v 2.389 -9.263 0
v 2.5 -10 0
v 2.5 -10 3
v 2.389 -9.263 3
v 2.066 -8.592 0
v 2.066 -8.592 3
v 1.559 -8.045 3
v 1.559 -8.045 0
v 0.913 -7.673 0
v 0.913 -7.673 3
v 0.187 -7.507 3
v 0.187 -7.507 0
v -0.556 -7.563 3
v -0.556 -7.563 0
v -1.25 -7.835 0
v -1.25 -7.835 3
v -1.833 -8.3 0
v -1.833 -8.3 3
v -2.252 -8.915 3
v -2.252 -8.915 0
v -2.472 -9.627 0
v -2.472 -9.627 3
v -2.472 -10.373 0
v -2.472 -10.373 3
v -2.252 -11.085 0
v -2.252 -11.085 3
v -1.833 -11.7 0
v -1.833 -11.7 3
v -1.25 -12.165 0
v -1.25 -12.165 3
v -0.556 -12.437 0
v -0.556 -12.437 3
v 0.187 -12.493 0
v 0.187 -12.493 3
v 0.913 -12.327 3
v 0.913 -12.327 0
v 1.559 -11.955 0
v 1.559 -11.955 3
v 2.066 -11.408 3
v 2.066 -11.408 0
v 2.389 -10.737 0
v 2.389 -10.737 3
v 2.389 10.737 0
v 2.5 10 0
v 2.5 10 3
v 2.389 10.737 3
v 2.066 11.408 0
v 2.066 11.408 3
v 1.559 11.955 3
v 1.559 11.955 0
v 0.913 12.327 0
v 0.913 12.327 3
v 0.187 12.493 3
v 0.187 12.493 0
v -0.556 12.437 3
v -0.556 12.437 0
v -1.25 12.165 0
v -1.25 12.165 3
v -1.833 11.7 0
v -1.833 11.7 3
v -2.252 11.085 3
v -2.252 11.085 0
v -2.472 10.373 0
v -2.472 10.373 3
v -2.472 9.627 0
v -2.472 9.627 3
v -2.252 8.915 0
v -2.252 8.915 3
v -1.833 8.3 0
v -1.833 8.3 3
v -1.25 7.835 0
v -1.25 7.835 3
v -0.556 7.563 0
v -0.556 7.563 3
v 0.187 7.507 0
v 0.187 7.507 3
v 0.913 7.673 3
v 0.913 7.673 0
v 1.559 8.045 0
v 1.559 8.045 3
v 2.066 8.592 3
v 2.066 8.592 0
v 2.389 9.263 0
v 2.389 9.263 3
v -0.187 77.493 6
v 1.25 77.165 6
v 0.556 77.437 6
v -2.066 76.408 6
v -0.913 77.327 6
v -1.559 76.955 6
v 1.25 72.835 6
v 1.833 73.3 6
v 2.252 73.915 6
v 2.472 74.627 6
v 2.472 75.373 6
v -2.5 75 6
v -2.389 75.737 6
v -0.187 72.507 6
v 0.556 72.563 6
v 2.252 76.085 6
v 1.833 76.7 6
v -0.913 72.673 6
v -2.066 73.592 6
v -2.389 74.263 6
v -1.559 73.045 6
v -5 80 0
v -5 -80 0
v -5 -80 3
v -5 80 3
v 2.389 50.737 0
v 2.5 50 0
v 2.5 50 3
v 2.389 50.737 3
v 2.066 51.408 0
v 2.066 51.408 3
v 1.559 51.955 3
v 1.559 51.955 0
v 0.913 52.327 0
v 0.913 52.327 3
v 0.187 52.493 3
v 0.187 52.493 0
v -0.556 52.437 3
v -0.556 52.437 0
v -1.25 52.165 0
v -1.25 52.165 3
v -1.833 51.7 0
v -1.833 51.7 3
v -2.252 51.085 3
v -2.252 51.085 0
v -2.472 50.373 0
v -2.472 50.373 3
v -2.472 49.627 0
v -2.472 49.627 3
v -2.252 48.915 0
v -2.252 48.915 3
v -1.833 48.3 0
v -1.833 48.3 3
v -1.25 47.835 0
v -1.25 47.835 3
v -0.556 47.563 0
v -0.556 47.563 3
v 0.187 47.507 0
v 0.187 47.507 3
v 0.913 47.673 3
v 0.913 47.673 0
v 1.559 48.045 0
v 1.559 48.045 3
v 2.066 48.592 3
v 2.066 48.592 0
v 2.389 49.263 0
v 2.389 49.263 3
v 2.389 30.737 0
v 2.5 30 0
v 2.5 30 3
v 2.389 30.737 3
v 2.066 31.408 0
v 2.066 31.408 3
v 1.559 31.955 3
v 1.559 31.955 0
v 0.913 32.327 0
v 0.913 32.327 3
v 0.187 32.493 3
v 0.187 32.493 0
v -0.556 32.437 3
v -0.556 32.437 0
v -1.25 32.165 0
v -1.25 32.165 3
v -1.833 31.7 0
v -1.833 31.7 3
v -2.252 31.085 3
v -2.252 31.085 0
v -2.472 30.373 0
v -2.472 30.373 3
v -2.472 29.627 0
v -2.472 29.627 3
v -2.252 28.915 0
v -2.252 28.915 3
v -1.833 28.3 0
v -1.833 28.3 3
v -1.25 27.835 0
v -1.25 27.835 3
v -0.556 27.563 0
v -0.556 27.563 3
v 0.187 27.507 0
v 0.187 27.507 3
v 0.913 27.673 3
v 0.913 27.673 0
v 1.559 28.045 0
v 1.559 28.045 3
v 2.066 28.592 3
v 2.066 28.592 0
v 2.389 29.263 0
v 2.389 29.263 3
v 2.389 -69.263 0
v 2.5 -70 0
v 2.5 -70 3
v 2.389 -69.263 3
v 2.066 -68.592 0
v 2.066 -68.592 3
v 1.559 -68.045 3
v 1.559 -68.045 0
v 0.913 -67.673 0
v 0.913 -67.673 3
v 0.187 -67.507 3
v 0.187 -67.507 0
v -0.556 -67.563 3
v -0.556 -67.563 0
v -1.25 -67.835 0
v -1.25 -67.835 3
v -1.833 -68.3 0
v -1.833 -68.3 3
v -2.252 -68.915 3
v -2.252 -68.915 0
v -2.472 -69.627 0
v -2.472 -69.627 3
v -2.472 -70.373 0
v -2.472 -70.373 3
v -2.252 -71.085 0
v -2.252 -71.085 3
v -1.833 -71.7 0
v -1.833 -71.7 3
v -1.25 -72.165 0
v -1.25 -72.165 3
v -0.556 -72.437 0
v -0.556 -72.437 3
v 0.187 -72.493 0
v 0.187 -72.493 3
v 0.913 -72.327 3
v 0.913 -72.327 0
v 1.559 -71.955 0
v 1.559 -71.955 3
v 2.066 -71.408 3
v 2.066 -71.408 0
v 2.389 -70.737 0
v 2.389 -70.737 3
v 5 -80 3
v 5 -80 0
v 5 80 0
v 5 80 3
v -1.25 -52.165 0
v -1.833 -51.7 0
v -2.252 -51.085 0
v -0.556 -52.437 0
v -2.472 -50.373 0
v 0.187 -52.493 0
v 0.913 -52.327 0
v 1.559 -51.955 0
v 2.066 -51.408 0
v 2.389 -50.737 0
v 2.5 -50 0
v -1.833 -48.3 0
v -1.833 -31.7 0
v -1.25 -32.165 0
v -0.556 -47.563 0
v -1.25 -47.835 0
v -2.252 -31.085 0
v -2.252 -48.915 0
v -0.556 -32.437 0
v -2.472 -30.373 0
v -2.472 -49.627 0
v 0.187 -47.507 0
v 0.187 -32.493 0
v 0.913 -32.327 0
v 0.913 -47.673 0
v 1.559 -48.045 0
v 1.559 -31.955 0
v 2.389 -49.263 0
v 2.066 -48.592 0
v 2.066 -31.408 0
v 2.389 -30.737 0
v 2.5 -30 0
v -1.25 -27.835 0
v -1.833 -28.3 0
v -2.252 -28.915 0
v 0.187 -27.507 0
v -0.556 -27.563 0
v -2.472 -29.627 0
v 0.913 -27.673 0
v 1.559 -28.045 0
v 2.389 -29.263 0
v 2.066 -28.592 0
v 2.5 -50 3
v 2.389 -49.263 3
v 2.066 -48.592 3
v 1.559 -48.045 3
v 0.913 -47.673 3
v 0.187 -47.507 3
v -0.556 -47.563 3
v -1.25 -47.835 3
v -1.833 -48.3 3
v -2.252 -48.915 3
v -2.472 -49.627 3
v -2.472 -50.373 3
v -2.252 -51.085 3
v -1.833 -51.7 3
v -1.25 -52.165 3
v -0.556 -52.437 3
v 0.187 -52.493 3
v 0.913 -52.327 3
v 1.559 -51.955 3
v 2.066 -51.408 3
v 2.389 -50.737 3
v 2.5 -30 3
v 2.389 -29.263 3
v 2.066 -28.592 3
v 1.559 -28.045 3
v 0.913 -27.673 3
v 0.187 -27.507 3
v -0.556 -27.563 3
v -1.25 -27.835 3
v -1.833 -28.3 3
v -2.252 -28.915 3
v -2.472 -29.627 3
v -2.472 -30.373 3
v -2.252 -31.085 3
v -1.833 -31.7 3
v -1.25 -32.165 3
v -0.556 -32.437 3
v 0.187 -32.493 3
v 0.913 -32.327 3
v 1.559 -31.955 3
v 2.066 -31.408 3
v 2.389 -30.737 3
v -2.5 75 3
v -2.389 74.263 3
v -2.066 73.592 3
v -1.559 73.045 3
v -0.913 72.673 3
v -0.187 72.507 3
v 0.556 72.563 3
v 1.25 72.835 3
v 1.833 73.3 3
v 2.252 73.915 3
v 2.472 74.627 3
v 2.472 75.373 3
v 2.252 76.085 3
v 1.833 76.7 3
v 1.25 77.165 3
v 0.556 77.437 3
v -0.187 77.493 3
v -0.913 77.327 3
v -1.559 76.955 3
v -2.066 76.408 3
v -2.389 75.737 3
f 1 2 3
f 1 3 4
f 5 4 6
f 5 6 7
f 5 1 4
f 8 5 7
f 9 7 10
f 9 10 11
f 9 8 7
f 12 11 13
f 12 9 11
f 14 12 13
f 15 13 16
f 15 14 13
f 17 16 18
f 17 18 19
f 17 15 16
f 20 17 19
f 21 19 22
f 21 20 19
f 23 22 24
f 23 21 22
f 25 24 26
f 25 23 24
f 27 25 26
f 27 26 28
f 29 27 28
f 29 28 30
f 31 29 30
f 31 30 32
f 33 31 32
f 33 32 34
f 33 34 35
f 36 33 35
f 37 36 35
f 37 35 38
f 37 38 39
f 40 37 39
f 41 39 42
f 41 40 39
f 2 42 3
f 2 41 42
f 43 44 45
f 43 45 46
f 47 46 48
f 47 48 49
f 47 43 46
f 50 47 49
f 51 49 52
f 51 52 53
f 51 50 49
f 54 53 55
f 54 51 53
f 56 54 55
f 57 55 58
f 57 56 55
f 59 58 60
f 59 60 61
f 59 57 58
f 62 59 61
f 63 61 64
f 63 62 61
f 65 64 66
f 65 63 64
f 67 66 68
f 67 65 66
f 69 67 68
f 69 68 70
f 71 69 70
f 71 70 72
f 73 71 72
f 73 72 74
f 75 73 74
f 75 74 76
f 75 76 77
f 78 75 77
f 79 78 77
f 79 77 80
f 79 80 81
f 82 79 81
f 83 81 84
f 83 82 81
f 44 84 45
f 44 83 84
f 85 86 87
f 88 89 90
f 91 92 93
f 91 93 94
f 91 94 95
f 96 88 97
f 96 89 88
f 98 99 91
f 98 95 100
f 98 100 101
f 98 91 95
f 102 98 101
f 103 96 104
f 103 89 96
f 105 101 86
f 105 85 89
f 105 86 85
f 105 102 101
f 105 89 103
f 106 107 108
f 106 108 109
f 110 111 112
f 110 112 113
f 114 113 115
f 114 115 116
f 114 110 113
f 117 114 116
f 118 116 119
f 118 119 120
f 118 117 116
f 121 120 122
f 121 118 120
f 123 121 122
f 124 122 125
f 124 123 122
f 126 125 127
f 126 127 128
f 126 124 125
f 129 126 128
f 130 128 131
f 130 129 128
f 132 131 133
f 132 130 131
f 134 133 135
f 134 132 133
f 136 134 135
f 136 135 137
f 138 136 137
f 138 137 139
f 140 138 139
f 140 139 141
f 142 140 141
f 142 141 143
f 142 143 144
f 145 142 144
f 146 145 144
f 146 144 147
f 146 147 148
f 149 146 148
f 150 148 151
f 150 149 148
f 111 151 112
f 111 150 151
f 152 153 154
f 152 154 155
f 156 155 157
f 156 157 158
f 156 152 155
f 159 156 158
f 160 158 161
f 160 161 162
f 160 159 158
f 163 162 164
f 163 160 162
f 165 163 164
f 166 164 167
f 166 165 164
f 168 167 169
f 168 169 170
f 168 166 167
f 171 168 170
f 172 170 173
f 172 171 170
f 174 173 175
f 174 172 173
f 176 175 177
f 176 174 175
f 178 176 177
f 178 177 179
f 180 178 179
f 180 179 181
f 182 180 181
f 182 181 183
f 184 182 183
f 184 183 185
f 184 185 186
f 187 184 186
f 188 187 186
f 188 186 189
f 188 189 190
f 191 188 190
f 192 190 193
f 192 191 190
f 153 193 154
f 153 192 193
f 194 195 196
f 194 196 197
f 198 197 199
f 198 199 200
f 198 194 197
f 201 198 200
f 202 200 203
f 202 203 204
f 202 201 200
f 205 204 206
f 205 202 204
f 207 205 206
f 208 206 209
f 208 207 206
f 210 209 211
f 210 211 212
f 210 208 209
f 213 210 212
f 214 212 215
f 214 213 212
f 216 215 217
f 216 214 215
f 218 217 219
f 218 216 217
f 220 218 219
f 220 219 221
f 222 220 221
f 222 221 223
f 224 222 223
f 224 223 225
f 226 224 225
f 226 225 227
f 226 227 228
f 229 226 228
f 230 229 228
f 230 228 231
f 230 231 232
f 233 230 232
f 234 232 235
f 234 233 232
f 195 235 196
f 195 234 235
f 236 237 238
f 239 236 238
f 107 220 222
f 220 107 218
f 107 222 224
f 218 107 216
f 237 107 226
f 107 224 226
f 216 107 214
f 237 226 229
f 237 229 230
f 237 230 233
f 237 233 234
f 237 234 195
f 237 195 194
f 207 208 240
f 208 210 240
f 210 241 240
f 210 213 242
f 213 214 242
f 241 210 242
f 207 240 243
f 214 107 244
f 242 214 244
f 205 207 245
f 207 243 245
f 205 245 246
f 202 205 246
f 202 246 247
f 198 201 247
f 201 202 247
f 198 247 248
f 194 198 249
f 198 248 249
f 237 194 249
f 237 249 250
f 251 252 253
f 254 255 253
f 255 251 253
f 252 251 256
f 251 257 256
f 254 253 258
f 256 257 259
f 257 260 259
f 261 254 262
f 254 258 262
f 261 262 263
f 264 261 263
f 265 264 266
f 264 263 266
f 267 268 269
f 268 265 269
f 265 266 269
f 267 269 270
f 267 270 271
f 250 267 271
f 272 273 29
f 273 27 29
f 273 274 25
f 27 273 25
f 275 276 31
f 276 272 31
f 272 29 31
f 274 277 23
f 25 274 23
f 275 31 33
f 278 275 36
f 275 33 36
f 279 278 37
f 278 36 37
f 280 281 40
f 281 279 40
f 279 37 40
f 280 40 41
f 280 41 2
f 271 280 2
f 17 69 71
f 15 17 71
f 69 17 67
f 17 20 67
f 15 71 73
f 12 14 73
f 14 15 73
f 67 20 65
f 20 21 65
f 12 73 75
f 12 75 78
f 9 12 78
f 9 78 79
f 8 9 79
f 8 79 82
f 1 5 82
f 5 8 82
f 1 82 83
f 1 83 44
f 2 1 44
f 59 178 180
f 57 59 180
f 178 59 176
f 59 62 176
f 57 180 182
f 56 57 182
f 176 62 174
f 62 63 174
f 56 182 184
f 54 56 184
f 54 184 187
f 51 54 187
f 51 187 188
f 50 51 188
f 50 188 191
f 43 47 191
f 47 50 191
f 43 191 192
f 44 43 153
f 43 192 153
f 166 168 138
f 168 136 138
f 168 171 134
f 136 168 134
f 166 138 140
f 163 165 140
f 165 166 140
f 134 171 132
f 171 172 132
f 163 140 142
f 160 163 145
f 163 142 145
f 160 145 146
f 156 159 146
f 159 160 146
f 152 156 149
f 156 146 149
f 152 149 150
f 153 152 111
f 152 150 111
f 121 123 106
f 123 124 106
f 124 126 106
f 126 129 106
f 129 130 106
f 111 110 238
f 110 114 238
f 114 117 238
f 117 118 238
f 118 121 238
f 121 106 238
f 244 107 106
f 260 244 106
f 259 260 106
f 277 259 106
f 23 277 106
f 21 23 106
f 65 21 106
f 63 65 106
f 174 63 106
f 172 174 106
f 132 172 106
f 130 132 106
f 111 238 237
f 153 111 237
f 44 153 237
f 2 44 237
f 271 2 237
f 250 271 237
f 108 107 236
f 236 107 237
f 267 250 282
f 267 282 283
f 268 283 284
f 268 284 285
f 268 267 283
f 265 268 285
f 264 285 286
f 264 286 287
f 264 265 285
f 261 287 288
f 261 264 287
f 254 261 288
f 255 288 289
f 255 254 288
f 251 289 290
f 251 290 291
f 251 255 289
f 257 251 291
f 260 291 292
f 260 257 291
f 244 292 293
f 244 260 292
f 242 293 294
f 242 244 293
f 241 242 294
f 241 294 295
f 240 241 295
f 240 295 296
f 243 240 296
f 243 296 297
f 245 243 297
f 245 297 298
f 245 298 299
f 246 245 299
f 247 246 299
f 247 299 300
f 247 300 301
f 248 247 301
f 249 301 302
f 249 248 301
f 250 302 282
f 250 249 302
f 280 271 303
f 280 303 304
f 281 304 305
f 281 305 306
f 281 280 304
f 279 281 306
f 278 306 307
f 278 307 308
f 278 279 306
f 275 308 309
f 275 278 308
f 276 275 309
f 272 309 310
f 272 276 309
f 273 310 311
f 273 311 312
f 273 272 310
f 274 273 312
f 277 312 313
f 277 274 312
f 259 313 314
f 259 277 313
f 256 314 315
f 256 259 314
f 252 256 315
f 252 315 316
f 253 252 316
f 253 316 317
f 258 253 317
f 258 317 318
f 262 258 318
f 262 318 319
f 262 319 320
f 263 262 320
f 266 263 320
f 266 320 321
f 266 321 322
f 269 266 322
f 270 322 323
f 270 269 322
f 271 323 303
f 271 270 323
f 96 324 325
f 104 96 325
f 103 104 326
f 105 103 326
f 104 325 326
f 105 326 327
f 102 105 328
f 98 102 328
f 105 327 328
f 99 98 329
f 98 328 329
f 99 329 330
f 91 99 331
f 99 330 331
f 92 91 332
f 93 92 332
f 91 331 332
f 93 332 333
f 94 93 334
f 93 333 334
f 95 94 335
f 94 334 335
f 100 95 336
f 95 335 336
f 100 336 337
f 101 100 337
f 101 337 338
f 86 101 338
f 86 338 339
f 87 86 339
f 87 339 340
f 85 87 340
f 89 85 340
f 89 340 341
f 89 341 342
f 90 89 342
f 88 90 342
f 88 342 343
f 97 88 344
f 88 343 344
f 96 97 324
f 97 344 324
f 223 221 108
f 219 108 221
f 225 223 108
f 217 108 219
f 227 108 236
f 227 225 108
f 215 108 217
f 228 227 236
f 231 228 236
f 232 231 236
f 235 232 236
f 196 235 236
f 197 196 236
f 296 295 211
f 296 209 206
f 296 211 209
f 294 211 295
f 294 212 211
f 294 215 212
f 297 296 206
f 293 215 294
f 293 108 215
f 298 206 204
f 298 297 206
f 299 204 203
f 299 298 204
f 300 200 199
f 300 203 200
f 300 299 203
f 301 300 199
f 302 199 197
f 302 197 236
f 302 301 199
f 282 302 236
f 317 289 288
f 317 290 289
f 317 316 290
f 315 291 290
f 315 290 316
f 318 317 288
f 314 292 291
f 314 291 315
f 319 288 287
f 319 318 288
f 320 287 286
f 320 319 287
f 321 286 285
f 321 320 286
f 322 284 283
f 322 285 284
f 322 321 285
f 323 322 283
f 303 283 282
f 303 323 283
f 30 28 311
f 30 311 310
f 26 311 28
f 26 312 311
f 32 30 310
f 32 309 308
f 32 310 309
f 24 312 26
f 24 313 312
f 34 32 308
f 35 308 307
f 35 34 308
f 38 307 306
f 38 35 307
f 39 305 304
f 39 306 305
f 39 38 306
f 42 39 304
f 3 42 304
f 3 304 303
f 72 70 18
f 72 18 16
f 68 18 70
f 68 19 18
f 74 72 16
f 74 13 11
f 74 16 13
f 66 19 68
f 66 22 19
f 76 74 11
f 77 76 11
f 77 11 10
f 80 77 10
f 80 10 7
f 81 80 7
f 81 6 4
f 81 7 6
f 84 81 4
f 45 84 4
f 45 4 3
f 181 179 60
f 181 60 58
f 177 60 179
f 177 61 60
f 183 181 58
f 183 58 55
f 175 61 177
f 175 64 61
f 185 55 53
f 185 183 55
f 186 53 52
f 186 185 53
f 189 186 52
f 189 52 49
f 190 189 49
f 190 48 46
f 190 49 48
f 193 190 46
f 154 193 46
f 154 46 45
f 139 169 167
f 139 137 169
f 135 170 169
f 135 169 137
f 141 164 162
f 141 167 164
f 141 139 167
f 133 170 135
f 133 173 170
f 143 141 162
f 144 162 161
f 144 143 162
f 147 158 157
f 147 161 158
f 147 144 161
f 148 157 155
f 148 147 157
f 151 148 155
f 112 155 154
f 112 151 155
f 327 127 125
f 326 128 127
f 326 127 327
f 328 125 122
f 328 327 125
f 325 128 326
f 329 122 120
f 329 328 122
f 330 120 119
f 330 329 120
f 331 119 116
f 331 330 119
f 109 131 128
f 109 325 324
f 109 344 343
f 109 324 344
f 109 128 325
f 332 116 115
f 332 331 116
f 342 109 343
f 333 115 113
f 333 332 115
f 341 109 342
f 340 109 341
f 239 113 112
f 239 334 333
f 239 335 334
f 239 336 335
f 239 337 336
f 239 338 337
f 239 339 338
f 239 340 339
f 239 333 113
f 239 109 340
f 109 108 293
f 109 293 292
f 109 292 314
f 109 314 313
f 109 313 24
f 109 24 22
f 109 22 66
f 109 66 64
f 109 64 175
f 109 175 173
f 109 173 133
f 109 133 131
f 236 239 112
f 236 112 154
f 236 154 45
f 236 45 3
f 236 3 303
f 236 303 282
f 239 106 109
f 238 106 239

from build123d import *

# Parameters (mm, degrees)
SKETCH_1_W      = 10
SKETCH_1_H      = 160
SKETCH_1_R      = 2.5
EXTRUDE_1_DEPTH = 3
SKETCH_2_R      = 2.5
EXTRUDE_2_DEPTH = 3


with BuildPart() as part:
    # 草圖1 → 填料-伸長1 (new body)
    with BuildSketch(Plane.XY):
        Rectangle(SKETCH_1_W, SKETCH_1_H)
        with Locations((0, -70)):
            Circle(SKETCH_1_R, mode=Mode.SUBTRACT)
        with Locations((0, -50)):
            Circle(SKETCH_1_R, mode=Mode.SUBTRACT)
        with Locations((0, -30)):
            Circle(SKETCH_1_R, mode=Mode.SUBTRACT)
        with Locations((0, -10)):
            Circle(SKETCH_1_R, mode=Mode.SUBTRACT)
        with Locations((0, 10)):
            Circle(SKETCH_1_R, mode=Mode.SUBTRACT)
        with Locations((0, 30)):
            Circle(SKETCH_1_R, mode=Mode.SUBTRACT)
        with Locations((0, 50)):
            Circle(SKETCH_1_R, mode=Mode.SUBTRACT)
    extrude(amount=EXTRUDE_1_DEPTH)

    # 草圖2 → 填料-伸長2 (add)
    with BuildSketch(Plane.XY.offset(3)):
        with Locations(Location((0, 75, 0), (0, 0, 180))):
            Circle(SKETCH_2_R)
    extrude(amount=EXTRUDE_2_DEPTH)


solid = part.part
